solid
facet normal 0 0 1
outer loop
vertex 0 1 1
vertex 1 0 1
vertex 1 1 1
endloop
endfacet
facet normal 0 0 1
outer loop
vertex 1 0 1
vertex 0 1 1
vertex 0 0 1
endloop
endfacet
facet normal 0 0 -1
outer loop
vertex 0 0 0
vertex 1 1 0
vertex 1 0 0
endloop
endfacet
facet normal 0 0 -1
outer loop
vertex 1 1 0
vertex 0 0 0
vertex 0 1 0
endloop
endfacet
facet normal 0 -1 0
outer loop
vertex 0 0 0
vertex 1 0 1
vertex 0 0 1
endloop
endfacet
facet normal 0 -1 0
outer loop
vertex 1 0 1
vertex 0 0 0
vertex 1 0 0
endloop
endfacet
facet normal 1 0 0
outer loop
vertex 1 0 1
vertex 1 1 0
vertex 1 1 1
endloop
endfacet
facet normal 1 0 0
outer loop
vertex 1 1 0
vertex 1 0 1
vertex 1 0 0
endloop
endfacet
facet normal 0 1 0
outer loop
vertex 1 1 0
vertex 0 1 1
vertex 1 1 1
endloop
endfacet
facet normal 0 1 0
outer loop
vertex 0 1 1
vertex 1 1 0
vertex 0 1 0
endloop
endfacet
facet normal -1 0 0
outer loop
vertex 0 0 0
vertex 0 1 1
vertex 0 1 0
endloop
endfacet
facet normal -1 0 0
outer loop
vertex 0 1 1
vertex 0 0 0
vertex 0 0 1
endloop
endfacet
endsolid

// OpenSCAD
cube(1);
echo(1 > 1);
echo(1 > 2);
echo(1 > "1");
echo(1 > "2");
echo("1" > 1);
echo("1" > 2);
echo("12" > "12");
echo("a" > "b");
echo("b" > "a");

echo(1 > true);
echo(0 > true);
echo("a" > true);

echo(true > 0);
echo(false > 0);
echo(true > 1);
echo(false > 1);
echo(true > 2);
echo(false > 2);

echo(0 > true);
echo(0 > false);
echo(1 > true);
echo(1 > false);
echo(2 > true);
echo(2 > false);

echo(true > "a");

echo(true > true);
echo(true > false);
echo(false > true);

echo([1] > [1]);
echo([1,2] > [1,2]);
echo([1,[2,3]] > [1,[2,3]]);
echo([1] > [2]);
echo([1,[2,3]] > [1,[2,4]]);


echo(1 > [1]);
echo(true > [1]);
echo("1" > [1]);

echo([1] > 1);
echo([1] > true);
echo([1] > "1");

echo(1+4 > 5);
